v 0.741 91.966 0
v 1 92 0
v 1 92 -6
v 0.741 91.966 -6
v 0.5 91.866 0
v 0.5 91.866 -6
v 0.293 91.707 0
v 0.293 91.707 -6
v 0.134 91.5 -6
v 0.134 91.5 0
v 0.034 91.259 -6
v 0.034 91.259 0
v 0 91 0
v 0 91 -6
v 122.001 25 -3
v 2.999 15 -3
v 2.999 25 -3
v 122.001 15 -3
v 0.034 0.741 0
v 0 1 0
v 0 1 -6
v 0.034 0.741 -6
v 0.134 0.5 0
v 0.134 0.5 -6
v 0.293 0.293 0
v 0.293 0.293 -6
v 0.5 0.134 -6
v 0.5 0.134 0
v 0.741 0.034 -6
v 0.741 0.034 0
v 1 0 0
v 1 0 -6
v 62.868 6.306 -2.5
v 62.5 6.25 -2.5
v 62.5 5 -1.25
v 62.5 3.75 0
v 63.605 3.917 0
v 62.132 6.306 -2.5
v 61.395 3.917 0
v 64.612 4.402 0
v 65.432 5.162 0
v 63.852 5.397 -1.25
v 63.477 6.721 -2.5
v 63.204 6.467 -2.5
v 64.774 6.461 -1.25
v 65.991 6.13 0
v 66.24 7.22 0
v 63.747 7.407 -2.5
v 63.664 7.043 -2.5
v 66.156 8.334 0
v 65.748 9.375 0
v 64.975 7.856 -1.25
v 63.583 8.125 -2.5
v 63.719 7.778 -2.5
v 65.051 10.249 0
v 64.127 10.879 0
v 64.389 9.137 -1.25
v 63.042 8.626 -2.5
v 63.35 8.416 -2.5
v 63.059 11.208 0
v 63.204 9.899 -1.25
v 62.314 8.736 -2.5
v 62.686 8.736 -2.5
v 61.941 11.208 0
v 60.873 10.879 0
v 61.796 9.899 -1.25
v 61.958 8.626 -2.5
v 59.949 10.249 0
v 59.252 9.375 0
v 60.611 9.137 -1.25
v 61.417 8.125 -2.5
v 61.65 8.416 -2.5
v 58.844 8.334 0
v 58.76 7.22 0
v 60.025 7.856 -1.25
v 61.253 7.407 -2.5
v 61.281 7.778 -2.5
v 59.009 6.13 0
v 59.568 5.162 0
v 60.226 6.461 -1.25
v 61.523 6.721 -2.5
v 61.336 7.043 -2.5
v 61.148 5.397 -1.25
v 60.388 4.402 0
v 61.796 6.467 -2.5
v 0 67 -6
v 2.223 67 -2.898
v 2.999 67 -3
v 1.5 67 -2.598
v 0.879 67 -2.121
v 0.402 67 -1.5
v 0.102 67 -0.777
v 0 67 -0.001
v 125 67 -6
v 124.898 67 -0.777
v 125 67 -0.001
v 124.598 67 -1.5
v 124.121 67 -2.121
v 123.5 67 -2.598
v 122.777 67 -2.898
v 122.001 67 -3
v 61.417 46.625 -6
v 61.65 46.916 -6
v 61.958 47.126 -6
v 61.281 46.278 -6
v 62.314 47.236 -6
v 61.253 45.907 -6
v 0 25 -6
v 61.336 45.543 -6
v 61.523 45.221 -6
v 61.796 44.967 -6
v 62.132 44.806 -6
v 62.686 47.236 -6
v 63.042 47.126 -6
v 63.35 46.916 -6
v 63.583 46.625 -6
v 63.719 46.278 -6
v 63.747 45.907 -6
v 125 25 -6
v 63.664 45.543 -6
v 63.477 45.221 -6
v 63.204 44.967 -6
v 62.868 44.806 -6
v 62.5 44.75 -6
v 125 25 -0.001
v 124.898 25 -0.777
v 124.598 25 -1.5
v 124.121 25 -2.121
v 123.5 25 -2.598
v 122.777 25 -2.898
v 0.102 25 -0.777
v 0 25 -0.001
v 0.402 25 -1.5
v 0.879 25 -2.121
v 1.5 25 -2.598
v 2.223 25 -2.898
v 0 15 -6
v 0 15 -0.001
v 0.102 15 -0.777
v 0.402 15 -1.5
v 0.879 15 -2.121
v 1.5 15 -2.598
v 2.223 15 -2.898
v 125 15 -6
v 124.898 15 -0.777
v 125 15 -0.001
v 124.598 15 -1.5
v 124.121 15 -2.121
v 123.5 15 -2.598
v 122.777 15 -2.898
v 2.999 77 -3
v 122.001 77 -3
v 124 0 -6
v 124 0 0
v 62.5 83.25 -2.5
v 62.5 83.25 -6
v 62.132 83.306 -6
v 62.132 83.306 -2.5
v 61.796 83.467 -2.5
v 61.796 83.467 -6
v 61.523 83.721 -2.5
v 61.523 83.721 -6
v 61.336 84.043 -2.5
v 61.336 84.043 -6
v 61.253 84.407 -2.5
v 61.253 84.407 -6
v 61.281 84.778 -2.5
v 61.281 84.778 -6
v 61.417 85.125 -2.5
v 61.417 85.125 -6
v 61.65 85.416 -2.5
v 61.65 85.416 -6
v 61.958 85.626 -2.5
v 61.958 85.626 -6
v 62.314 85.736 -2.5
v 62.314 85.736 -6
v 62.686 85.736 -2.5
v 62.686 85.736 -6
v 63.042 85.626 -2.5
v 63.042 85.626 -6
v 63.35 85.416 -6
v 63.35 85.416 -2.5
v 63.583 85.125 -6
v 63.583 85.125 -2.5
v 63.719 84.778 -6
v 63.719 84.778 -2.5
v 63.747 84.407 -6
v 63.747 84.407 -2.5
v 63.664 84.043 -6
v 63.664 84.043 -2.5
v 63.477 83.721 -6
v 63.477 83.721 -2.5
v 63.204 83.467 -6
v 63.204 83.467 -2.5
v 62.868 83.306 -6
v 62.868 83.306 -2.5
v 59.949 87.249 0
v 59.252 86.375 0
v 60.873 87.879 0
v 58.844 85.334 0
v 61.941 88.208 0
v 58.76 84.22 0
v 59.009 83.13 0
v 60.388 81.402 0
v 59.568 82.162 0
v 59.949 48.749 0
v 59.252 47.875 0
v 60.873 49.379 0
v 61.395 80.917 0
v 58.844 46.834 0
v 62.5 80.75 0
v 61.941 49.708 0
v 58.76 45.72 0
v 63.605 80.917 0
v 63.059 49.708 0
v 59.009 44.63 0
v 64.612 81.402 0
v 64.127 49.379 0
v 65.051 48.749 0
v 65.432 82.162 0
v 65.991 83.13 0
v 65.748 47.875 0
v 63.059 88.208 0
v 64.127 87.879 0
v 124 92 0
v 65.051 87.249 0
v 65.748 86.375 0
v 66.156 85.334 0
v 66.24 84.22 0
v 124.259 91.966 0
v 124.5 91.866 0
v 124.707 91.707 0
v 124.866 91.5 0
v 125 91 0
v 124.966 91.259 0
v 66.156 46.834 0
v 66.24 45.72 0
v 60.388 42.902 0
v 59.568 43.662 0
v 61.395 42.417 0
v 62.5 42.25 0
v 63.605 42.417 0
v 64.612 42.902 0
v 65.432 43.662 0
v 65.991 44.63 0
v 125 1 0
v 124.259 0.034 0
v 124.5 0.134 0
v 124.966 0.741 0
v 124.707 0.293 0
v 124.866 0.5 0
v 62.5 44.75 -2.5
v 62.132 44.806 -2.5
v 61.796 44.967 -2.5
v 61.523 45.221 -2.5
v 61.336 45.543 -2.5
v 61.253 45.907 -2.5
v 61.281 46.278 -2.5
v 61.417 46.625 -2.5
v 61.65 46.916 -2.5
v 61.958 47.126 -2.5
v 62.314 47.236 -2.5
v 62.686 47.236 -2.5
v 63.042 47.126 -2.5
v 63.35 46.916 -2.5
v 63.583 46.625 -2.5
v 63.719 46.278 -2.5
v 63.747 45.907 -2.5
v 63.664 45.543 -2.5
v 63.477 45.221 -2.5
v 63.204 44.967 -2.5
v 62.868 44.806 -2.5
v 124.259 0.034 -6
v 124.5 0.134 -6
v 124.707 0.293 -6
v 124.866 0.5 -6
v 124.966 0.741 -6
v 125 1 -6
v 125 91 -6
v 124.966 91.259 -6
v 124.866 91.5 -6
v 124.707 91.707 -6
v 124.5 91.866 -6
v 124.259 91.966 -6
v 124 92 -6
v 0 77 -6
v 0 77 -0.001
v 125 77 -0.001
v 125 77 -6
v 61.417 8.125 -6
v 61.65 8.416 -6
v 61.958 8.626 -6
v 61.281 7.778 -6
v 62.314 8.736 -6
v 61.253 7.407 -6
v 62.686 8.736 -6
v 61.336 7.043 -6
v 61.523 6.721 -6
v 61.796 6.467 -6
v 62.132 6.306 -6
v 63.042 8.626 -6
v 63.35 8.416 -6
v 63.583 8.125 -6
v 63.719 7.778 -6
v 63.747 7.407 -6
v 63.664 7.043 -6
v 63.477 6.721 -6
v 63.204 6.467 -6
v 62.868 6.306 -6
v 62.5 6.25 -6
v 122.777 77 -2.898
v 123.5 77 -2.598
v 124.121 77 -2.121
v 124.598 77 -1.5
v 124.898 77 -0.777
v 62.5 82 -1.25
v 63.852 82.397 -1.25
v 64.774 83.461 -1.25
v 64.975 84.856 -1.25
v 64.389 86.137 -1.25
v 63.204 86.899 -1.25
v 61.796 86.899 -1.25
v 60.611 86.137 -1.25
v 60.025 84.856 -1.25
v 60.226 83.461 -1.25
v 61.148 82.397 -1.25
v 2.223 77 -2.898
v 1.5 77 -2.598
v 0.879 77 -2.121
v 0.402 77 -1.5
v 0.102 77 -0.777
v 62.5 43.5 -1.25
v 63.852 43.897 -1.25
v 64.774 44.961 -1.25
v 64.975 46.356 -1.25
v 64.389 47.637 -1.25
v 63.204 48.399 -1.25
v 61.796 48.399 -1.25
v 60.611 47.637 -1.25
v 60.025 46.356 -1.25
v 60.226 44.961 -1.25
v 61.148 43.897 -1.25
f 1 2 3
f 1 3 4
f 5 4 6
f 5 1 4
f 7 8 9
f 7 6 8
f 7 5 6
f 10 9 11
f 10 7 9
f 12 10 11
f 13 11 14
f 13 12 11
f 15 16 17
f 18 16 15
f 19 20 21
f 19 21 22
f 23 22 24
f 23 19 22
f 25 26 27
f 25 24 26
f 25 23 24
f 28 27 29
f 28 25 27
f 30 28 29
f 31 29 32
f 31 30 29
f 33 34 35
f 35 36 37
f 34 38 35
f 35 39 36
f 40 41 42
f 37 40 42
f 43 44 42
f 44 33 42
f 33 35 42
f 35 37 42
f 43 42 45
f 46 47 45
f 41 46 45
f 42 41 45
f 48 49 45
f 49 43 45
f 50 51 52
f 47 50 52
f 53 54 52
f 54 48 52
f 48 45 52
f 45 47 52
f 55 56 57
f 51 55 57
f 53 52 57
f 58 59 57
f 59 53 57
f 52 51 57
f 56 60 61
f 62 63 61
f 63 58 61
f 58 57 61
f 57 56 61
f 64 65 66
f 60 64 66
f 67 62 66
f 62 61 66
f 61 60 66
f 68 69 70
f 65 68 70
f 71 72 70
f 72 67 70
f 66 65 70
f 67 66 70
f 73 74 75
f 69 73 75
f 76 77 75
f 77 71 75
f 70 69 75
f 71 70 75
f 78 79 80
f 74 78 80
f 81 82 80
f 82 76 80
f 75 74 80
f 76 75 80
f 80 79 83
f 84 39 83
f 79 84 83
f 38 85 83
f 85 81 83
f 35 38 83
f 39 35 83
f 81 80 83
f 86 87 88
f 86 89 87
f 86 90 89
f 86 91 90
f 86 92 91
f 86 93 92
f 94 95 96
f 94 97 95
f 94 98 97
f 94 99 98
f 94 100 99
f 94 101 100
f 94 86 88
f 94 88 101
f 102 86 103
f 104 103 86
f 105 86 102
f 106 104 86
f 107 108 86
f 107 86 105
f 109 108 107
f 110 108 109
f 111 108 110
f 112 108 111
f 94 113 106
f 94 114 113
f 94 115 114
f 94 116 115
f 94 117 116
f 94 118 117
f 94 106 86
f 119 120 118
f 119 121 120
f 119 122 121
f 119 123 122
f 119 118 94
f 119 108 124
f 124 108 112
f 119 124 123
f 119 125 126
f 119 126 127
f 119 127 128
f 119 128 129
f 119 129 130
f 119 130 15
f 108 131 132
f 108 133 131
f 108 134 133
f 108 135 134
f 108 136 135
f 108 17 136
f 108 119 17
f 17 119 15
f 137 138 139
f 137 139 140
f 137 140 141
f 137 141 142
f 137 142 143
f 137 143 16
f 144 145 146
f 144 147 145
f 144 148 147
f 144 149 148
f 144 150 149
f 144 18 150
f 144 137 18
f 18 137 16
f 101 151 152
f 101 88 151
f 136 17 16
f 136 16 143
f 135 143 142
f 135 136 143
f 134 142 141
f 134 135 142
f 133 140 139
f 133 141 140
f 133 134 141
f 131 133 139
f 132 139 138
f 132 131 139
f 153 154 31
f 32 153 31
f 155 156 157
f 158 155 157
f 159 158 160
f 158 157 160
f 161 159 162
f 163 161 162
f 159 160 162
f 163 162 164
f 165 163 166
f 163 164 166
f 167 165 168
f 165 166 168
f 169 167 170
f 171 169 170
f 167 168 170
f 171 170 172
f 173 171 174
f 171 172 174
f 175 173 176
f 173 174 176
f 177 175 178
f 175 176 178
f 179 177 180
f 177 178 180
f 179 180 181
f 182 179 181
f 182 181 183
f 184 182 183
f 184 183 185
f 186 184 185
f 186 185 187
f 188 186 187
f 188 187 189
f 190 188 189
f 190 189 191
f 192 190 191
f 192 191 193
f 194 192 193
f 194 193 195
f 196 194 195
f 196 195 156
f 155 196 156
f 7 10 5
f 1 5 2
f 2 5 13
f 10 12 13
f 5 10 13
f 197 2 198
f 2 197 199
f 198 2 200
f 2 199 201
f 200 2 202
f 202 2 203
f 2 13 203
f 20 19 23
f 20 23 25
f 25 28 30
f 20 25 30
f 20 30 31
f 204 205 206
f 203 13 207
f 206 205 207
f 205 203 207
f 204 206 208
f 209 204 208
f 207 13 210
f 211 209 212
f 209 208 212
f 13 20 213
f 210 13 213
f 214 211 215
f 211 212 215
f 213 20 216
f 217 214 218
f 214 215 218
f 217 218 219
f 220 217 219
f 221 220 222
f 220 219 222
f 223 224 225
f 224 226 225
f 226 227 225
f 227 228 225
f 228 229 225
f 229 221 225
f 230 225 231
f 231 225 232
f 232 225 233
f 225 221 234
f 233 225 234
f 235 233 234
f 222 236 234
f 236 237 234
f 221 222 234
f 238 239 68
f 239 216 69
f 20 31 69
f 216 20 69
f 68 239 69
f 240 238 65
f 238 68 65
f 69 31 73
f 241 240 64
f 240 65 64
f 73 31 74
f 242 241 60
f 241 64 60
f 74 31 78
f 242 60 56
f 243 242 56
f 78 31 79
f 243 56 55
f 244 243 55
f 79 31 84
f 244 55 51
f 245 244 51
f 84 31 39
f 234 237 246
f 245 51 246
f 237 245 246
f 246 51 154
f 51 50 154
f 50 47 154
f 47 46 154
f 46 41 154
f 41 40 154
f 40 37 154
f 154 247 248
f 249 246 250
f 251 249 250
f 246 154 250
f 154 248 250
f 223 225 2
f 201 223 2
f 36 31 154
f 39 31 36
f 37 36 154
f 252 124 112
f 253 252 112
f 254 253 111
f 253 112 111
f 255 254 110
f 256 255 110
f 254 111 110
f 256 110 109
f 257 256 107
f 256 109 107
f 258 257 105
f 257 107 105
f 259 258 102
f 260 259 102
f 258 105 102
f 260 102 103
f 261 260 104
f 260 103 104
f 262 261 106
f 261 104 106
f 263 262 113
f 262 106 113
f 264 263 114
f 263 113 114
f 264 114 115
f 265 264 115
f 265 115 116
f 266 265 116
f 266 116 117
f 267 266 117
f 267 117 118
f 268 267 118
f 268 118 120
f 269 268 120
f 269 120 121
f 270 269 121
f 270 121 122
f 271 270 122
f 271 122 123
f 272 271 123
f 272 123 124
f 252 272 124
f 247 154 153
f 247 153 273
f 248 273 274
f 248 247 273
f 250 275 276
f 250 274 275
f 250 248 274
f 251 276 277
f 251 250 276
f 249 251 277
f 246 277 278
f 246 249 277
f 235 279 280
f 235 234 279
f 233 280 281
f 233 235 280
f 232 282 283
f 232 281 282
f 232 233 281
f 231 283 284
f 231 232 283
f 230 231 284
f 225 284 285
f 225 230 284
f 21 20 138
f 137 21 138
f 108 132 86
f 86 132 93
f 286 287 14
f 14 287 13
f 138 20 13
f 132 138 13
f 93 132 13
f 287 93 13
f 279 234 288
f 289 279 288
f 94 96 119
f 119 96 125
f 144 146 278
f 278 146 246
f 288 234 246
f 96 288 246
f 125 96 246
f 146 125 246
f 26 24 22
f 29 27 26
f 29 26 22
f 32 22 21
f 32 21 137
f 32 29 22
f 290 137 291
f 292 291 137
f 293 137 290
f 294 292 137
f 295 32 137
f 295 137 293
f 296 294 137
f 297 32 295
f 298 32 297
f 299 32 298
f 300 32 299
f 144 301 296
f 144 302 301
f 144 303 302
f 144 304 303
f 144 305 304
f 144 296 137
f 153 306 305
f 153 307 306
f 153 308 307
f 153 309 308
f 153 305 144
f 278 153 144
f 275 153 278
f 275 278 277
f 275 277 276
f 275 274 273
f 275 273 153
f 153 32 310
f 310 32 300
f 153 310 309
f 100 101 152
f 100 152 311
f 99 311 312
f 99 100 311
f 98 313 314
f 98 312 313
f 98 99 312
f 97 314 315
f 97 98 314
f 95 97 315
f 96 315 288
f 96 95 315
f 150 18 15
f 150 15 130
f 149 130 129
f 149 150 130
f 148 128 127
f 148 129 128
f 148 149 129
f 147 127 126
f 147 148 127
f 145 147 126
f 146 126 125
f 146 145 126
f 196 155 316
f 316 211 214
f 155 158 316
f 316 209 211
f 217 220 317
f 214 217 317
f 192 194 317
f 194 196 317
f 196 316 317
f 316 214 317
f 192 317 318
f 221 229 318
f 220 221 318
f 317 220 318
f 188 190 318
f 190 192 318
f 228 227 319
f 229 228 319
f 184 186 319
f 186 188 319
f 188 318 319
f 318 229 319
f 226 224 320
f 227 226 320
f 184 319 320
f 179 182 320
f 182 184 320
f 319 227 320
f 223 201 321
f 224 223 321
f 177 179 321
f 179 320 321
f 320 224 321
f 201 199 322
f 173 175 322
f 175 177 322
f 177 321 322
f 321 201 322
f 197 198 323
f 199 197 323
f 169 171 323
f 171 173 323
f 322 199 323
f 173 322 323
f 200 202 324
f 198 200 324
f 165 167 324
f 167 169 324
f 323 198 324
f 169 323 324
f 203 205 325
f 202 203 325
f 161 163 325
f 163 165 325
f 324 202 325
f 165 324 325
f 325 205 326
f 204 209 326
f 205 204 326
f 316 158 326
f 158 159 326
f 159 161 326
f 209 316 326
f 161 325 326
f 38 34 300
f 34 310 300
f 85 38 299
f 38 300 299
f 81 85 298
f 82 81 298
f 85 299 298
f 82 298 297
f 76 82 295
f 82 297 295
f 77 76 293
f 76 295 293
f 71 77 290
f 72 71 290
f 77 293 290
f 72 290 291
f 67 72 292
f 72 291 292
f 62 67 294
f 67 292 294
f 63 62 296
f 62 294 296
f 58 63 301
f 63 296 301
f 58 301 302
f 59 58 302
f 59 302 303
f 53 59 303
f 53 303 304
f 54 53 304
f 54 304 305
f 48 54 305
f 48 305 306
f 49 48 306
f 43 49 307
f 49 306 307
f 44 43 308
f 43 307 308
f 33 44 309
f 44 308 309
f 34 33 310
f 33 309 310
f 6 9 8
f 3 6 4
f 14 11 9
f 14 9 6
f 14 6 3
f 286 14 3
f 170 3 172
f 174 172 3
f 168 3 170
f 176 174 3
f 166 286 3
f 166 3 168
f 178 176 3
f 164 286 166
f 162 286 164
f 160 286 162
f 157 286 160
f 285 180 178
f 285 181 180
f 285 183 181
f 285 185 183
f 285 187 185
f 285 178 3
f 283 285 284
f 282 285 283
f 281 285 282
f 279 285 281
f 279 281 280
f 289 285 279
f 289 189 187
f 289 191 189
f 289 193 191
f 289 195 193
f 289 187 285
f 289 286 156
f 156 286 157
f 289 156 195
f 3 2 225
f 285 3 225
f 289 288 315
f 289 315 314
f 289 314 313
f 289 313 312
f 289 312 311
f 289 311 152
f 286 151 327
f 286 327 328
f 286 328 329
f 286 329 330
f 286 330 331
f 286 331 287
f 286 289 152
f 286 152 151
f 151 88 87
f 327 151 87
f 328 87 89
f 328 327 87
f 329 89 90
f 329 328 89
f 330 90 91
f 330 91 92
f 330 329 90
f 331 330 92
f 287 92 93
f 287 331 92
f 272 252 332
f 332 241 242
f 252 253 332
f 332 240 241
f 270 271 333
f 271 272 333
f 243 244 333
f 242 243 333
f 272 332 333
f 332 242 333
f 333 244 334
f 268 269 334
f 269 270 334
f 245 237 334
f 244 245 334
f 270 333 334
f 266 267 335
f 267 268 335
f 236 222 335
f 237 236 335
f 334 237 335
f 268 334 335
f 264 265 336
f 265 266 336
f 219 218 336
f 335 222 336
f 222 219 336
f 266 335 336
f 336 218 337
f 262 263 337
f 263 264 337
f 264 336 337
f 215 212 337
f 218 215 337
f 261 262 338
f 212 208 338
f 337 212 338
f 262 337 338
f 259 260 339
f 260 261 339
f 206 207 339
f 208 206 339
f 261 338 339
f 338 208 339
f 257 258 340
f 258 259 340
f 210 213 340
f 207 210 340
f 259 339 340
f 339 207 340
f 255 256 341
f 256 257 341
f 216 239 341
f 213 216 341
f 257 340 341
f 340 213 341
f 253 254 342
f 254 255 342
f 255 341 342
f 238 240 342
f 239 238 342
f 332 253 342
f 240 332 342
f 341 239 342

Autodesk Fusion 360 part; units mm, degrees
sketch "Sketch2" plane through (0, 0, 0) normal (0, 0, -1) x (1, 0, 0)
  arc A0 (124, -92) -> (125, -91) centre (124, -91) ccw
  line L0 (125, -91) -> (125, -1)
  arc A1 (125, -1) -> (124, 0) centre (124, -1) ccw
  line L1 (124, 0) -> (1, 0)
  arc A2 (1, 0) -> (0, -1) centre (1, -1) ccw
  line L2 (0, -1) -> (0, -91)
  arc A3 (0, -91) -> (1, -92) centre (1, -91) ccw
  line L3 (1, -92) -> (124, -92)
  circle A4 centre (54.1, -72.1) radius 1
  circle A5 centre (11, -21.3) radius 1
  circle A6 centre (26.2, -72.1) radius 1
  circle A7 centre (59.2, -20) radius 1
extrude "Extrude1" add sketch "Sketch2" along normal blind 6
sketch "Sketch1" plane through (0, 0, -6) normal (0, 0, -1) x (1, 0, 0)
  circle A0 centre (59.2, -20) radius 1
  circle A1 centre (11, -21.3) radius 1
  circle A2 centre (26.2, -72.1) radius 1
  circle A3 centre (54.1, -72.1) radius 1
  line L0 (1, -92) -> (124, -92)
  arc A4 (124, -92) -> (125, -91) centre (124, -91) ccw
  line L1 (125, -91) -> (125, -1)
  arc A5 (125, -1) -> (124, 0) centre (124, -1) ccw
  line L2 (124, 0) -> (1, 0)
  arc A6 (1, 0) -> (0, -1) centre (1, -1) ccw
  line L3 (0, -1) -> (0, -91)
  arc A7 (0, -91) -> (1, -92) centre (1, -91) ccw
  line L4 (0, -15) -> (125, -15)
  line L5 (125, -15) -> (125, -25)
  line L6 (125, -25) -> (0, -25)
  line L7 (0, -25) -> (0, -15)
  line L8 (0, -67) -> (125, -67)
  line L9 (125, -67) -> (125, -77)
  line L10 (125, -77) -> (0, -77)
  line L11 (0, -77) -> (0, -67)
  dimension "d215" = 15
  dimension "d216" = 10
  dimension "d217" = 15
  dimension "d218" = 10
extrude "Extrude2" cut sketch "Sketch1" against normal blind 3 contours L1 L3 L8 L9 L10 L11 | L1 L3 L4 L5 L6 L7
fillet "Fillet1" radius 3 1 edges at (125, 20, -3)
fillet "Fillet2" radius 3 1 edges at (125, 72, -3)
fillet "Fillet3" radius 3 1 edges at (0, 72, -3)
fillet "Fillet4" radius 3 1 edges at (0, 20, -3)
delete_face "DeleteFace1" 1 faces at (60.1215, 19.6116, -2)
delete_face "DeleteFace2" 1 faces at (11.995, 21.3996, -1)
delete_face "DeleteFace3" 1 faces at (25.2198, 71.9019, -2)
delete_face "DeleteFace4" 1 faces at (55.0691, 71.8532, -2)
hole "Hole1" at (62.5, 46, 0) direction (0, 0, -1) diameter 2.5 end through all countersink diameter 7.5 countersink angle 90
hole "Hole2" at (62.5, 7.5, 0) direction (0, 0, -1) diameter 2.5 end through all countersink diameter 7.5 countersink angle 90
hole "Hole3" at (62.5, 84.5, 0) direction (0, 0, -1) diameter 2.5 end through all countersink diameter 7.5 countersink angle 90
